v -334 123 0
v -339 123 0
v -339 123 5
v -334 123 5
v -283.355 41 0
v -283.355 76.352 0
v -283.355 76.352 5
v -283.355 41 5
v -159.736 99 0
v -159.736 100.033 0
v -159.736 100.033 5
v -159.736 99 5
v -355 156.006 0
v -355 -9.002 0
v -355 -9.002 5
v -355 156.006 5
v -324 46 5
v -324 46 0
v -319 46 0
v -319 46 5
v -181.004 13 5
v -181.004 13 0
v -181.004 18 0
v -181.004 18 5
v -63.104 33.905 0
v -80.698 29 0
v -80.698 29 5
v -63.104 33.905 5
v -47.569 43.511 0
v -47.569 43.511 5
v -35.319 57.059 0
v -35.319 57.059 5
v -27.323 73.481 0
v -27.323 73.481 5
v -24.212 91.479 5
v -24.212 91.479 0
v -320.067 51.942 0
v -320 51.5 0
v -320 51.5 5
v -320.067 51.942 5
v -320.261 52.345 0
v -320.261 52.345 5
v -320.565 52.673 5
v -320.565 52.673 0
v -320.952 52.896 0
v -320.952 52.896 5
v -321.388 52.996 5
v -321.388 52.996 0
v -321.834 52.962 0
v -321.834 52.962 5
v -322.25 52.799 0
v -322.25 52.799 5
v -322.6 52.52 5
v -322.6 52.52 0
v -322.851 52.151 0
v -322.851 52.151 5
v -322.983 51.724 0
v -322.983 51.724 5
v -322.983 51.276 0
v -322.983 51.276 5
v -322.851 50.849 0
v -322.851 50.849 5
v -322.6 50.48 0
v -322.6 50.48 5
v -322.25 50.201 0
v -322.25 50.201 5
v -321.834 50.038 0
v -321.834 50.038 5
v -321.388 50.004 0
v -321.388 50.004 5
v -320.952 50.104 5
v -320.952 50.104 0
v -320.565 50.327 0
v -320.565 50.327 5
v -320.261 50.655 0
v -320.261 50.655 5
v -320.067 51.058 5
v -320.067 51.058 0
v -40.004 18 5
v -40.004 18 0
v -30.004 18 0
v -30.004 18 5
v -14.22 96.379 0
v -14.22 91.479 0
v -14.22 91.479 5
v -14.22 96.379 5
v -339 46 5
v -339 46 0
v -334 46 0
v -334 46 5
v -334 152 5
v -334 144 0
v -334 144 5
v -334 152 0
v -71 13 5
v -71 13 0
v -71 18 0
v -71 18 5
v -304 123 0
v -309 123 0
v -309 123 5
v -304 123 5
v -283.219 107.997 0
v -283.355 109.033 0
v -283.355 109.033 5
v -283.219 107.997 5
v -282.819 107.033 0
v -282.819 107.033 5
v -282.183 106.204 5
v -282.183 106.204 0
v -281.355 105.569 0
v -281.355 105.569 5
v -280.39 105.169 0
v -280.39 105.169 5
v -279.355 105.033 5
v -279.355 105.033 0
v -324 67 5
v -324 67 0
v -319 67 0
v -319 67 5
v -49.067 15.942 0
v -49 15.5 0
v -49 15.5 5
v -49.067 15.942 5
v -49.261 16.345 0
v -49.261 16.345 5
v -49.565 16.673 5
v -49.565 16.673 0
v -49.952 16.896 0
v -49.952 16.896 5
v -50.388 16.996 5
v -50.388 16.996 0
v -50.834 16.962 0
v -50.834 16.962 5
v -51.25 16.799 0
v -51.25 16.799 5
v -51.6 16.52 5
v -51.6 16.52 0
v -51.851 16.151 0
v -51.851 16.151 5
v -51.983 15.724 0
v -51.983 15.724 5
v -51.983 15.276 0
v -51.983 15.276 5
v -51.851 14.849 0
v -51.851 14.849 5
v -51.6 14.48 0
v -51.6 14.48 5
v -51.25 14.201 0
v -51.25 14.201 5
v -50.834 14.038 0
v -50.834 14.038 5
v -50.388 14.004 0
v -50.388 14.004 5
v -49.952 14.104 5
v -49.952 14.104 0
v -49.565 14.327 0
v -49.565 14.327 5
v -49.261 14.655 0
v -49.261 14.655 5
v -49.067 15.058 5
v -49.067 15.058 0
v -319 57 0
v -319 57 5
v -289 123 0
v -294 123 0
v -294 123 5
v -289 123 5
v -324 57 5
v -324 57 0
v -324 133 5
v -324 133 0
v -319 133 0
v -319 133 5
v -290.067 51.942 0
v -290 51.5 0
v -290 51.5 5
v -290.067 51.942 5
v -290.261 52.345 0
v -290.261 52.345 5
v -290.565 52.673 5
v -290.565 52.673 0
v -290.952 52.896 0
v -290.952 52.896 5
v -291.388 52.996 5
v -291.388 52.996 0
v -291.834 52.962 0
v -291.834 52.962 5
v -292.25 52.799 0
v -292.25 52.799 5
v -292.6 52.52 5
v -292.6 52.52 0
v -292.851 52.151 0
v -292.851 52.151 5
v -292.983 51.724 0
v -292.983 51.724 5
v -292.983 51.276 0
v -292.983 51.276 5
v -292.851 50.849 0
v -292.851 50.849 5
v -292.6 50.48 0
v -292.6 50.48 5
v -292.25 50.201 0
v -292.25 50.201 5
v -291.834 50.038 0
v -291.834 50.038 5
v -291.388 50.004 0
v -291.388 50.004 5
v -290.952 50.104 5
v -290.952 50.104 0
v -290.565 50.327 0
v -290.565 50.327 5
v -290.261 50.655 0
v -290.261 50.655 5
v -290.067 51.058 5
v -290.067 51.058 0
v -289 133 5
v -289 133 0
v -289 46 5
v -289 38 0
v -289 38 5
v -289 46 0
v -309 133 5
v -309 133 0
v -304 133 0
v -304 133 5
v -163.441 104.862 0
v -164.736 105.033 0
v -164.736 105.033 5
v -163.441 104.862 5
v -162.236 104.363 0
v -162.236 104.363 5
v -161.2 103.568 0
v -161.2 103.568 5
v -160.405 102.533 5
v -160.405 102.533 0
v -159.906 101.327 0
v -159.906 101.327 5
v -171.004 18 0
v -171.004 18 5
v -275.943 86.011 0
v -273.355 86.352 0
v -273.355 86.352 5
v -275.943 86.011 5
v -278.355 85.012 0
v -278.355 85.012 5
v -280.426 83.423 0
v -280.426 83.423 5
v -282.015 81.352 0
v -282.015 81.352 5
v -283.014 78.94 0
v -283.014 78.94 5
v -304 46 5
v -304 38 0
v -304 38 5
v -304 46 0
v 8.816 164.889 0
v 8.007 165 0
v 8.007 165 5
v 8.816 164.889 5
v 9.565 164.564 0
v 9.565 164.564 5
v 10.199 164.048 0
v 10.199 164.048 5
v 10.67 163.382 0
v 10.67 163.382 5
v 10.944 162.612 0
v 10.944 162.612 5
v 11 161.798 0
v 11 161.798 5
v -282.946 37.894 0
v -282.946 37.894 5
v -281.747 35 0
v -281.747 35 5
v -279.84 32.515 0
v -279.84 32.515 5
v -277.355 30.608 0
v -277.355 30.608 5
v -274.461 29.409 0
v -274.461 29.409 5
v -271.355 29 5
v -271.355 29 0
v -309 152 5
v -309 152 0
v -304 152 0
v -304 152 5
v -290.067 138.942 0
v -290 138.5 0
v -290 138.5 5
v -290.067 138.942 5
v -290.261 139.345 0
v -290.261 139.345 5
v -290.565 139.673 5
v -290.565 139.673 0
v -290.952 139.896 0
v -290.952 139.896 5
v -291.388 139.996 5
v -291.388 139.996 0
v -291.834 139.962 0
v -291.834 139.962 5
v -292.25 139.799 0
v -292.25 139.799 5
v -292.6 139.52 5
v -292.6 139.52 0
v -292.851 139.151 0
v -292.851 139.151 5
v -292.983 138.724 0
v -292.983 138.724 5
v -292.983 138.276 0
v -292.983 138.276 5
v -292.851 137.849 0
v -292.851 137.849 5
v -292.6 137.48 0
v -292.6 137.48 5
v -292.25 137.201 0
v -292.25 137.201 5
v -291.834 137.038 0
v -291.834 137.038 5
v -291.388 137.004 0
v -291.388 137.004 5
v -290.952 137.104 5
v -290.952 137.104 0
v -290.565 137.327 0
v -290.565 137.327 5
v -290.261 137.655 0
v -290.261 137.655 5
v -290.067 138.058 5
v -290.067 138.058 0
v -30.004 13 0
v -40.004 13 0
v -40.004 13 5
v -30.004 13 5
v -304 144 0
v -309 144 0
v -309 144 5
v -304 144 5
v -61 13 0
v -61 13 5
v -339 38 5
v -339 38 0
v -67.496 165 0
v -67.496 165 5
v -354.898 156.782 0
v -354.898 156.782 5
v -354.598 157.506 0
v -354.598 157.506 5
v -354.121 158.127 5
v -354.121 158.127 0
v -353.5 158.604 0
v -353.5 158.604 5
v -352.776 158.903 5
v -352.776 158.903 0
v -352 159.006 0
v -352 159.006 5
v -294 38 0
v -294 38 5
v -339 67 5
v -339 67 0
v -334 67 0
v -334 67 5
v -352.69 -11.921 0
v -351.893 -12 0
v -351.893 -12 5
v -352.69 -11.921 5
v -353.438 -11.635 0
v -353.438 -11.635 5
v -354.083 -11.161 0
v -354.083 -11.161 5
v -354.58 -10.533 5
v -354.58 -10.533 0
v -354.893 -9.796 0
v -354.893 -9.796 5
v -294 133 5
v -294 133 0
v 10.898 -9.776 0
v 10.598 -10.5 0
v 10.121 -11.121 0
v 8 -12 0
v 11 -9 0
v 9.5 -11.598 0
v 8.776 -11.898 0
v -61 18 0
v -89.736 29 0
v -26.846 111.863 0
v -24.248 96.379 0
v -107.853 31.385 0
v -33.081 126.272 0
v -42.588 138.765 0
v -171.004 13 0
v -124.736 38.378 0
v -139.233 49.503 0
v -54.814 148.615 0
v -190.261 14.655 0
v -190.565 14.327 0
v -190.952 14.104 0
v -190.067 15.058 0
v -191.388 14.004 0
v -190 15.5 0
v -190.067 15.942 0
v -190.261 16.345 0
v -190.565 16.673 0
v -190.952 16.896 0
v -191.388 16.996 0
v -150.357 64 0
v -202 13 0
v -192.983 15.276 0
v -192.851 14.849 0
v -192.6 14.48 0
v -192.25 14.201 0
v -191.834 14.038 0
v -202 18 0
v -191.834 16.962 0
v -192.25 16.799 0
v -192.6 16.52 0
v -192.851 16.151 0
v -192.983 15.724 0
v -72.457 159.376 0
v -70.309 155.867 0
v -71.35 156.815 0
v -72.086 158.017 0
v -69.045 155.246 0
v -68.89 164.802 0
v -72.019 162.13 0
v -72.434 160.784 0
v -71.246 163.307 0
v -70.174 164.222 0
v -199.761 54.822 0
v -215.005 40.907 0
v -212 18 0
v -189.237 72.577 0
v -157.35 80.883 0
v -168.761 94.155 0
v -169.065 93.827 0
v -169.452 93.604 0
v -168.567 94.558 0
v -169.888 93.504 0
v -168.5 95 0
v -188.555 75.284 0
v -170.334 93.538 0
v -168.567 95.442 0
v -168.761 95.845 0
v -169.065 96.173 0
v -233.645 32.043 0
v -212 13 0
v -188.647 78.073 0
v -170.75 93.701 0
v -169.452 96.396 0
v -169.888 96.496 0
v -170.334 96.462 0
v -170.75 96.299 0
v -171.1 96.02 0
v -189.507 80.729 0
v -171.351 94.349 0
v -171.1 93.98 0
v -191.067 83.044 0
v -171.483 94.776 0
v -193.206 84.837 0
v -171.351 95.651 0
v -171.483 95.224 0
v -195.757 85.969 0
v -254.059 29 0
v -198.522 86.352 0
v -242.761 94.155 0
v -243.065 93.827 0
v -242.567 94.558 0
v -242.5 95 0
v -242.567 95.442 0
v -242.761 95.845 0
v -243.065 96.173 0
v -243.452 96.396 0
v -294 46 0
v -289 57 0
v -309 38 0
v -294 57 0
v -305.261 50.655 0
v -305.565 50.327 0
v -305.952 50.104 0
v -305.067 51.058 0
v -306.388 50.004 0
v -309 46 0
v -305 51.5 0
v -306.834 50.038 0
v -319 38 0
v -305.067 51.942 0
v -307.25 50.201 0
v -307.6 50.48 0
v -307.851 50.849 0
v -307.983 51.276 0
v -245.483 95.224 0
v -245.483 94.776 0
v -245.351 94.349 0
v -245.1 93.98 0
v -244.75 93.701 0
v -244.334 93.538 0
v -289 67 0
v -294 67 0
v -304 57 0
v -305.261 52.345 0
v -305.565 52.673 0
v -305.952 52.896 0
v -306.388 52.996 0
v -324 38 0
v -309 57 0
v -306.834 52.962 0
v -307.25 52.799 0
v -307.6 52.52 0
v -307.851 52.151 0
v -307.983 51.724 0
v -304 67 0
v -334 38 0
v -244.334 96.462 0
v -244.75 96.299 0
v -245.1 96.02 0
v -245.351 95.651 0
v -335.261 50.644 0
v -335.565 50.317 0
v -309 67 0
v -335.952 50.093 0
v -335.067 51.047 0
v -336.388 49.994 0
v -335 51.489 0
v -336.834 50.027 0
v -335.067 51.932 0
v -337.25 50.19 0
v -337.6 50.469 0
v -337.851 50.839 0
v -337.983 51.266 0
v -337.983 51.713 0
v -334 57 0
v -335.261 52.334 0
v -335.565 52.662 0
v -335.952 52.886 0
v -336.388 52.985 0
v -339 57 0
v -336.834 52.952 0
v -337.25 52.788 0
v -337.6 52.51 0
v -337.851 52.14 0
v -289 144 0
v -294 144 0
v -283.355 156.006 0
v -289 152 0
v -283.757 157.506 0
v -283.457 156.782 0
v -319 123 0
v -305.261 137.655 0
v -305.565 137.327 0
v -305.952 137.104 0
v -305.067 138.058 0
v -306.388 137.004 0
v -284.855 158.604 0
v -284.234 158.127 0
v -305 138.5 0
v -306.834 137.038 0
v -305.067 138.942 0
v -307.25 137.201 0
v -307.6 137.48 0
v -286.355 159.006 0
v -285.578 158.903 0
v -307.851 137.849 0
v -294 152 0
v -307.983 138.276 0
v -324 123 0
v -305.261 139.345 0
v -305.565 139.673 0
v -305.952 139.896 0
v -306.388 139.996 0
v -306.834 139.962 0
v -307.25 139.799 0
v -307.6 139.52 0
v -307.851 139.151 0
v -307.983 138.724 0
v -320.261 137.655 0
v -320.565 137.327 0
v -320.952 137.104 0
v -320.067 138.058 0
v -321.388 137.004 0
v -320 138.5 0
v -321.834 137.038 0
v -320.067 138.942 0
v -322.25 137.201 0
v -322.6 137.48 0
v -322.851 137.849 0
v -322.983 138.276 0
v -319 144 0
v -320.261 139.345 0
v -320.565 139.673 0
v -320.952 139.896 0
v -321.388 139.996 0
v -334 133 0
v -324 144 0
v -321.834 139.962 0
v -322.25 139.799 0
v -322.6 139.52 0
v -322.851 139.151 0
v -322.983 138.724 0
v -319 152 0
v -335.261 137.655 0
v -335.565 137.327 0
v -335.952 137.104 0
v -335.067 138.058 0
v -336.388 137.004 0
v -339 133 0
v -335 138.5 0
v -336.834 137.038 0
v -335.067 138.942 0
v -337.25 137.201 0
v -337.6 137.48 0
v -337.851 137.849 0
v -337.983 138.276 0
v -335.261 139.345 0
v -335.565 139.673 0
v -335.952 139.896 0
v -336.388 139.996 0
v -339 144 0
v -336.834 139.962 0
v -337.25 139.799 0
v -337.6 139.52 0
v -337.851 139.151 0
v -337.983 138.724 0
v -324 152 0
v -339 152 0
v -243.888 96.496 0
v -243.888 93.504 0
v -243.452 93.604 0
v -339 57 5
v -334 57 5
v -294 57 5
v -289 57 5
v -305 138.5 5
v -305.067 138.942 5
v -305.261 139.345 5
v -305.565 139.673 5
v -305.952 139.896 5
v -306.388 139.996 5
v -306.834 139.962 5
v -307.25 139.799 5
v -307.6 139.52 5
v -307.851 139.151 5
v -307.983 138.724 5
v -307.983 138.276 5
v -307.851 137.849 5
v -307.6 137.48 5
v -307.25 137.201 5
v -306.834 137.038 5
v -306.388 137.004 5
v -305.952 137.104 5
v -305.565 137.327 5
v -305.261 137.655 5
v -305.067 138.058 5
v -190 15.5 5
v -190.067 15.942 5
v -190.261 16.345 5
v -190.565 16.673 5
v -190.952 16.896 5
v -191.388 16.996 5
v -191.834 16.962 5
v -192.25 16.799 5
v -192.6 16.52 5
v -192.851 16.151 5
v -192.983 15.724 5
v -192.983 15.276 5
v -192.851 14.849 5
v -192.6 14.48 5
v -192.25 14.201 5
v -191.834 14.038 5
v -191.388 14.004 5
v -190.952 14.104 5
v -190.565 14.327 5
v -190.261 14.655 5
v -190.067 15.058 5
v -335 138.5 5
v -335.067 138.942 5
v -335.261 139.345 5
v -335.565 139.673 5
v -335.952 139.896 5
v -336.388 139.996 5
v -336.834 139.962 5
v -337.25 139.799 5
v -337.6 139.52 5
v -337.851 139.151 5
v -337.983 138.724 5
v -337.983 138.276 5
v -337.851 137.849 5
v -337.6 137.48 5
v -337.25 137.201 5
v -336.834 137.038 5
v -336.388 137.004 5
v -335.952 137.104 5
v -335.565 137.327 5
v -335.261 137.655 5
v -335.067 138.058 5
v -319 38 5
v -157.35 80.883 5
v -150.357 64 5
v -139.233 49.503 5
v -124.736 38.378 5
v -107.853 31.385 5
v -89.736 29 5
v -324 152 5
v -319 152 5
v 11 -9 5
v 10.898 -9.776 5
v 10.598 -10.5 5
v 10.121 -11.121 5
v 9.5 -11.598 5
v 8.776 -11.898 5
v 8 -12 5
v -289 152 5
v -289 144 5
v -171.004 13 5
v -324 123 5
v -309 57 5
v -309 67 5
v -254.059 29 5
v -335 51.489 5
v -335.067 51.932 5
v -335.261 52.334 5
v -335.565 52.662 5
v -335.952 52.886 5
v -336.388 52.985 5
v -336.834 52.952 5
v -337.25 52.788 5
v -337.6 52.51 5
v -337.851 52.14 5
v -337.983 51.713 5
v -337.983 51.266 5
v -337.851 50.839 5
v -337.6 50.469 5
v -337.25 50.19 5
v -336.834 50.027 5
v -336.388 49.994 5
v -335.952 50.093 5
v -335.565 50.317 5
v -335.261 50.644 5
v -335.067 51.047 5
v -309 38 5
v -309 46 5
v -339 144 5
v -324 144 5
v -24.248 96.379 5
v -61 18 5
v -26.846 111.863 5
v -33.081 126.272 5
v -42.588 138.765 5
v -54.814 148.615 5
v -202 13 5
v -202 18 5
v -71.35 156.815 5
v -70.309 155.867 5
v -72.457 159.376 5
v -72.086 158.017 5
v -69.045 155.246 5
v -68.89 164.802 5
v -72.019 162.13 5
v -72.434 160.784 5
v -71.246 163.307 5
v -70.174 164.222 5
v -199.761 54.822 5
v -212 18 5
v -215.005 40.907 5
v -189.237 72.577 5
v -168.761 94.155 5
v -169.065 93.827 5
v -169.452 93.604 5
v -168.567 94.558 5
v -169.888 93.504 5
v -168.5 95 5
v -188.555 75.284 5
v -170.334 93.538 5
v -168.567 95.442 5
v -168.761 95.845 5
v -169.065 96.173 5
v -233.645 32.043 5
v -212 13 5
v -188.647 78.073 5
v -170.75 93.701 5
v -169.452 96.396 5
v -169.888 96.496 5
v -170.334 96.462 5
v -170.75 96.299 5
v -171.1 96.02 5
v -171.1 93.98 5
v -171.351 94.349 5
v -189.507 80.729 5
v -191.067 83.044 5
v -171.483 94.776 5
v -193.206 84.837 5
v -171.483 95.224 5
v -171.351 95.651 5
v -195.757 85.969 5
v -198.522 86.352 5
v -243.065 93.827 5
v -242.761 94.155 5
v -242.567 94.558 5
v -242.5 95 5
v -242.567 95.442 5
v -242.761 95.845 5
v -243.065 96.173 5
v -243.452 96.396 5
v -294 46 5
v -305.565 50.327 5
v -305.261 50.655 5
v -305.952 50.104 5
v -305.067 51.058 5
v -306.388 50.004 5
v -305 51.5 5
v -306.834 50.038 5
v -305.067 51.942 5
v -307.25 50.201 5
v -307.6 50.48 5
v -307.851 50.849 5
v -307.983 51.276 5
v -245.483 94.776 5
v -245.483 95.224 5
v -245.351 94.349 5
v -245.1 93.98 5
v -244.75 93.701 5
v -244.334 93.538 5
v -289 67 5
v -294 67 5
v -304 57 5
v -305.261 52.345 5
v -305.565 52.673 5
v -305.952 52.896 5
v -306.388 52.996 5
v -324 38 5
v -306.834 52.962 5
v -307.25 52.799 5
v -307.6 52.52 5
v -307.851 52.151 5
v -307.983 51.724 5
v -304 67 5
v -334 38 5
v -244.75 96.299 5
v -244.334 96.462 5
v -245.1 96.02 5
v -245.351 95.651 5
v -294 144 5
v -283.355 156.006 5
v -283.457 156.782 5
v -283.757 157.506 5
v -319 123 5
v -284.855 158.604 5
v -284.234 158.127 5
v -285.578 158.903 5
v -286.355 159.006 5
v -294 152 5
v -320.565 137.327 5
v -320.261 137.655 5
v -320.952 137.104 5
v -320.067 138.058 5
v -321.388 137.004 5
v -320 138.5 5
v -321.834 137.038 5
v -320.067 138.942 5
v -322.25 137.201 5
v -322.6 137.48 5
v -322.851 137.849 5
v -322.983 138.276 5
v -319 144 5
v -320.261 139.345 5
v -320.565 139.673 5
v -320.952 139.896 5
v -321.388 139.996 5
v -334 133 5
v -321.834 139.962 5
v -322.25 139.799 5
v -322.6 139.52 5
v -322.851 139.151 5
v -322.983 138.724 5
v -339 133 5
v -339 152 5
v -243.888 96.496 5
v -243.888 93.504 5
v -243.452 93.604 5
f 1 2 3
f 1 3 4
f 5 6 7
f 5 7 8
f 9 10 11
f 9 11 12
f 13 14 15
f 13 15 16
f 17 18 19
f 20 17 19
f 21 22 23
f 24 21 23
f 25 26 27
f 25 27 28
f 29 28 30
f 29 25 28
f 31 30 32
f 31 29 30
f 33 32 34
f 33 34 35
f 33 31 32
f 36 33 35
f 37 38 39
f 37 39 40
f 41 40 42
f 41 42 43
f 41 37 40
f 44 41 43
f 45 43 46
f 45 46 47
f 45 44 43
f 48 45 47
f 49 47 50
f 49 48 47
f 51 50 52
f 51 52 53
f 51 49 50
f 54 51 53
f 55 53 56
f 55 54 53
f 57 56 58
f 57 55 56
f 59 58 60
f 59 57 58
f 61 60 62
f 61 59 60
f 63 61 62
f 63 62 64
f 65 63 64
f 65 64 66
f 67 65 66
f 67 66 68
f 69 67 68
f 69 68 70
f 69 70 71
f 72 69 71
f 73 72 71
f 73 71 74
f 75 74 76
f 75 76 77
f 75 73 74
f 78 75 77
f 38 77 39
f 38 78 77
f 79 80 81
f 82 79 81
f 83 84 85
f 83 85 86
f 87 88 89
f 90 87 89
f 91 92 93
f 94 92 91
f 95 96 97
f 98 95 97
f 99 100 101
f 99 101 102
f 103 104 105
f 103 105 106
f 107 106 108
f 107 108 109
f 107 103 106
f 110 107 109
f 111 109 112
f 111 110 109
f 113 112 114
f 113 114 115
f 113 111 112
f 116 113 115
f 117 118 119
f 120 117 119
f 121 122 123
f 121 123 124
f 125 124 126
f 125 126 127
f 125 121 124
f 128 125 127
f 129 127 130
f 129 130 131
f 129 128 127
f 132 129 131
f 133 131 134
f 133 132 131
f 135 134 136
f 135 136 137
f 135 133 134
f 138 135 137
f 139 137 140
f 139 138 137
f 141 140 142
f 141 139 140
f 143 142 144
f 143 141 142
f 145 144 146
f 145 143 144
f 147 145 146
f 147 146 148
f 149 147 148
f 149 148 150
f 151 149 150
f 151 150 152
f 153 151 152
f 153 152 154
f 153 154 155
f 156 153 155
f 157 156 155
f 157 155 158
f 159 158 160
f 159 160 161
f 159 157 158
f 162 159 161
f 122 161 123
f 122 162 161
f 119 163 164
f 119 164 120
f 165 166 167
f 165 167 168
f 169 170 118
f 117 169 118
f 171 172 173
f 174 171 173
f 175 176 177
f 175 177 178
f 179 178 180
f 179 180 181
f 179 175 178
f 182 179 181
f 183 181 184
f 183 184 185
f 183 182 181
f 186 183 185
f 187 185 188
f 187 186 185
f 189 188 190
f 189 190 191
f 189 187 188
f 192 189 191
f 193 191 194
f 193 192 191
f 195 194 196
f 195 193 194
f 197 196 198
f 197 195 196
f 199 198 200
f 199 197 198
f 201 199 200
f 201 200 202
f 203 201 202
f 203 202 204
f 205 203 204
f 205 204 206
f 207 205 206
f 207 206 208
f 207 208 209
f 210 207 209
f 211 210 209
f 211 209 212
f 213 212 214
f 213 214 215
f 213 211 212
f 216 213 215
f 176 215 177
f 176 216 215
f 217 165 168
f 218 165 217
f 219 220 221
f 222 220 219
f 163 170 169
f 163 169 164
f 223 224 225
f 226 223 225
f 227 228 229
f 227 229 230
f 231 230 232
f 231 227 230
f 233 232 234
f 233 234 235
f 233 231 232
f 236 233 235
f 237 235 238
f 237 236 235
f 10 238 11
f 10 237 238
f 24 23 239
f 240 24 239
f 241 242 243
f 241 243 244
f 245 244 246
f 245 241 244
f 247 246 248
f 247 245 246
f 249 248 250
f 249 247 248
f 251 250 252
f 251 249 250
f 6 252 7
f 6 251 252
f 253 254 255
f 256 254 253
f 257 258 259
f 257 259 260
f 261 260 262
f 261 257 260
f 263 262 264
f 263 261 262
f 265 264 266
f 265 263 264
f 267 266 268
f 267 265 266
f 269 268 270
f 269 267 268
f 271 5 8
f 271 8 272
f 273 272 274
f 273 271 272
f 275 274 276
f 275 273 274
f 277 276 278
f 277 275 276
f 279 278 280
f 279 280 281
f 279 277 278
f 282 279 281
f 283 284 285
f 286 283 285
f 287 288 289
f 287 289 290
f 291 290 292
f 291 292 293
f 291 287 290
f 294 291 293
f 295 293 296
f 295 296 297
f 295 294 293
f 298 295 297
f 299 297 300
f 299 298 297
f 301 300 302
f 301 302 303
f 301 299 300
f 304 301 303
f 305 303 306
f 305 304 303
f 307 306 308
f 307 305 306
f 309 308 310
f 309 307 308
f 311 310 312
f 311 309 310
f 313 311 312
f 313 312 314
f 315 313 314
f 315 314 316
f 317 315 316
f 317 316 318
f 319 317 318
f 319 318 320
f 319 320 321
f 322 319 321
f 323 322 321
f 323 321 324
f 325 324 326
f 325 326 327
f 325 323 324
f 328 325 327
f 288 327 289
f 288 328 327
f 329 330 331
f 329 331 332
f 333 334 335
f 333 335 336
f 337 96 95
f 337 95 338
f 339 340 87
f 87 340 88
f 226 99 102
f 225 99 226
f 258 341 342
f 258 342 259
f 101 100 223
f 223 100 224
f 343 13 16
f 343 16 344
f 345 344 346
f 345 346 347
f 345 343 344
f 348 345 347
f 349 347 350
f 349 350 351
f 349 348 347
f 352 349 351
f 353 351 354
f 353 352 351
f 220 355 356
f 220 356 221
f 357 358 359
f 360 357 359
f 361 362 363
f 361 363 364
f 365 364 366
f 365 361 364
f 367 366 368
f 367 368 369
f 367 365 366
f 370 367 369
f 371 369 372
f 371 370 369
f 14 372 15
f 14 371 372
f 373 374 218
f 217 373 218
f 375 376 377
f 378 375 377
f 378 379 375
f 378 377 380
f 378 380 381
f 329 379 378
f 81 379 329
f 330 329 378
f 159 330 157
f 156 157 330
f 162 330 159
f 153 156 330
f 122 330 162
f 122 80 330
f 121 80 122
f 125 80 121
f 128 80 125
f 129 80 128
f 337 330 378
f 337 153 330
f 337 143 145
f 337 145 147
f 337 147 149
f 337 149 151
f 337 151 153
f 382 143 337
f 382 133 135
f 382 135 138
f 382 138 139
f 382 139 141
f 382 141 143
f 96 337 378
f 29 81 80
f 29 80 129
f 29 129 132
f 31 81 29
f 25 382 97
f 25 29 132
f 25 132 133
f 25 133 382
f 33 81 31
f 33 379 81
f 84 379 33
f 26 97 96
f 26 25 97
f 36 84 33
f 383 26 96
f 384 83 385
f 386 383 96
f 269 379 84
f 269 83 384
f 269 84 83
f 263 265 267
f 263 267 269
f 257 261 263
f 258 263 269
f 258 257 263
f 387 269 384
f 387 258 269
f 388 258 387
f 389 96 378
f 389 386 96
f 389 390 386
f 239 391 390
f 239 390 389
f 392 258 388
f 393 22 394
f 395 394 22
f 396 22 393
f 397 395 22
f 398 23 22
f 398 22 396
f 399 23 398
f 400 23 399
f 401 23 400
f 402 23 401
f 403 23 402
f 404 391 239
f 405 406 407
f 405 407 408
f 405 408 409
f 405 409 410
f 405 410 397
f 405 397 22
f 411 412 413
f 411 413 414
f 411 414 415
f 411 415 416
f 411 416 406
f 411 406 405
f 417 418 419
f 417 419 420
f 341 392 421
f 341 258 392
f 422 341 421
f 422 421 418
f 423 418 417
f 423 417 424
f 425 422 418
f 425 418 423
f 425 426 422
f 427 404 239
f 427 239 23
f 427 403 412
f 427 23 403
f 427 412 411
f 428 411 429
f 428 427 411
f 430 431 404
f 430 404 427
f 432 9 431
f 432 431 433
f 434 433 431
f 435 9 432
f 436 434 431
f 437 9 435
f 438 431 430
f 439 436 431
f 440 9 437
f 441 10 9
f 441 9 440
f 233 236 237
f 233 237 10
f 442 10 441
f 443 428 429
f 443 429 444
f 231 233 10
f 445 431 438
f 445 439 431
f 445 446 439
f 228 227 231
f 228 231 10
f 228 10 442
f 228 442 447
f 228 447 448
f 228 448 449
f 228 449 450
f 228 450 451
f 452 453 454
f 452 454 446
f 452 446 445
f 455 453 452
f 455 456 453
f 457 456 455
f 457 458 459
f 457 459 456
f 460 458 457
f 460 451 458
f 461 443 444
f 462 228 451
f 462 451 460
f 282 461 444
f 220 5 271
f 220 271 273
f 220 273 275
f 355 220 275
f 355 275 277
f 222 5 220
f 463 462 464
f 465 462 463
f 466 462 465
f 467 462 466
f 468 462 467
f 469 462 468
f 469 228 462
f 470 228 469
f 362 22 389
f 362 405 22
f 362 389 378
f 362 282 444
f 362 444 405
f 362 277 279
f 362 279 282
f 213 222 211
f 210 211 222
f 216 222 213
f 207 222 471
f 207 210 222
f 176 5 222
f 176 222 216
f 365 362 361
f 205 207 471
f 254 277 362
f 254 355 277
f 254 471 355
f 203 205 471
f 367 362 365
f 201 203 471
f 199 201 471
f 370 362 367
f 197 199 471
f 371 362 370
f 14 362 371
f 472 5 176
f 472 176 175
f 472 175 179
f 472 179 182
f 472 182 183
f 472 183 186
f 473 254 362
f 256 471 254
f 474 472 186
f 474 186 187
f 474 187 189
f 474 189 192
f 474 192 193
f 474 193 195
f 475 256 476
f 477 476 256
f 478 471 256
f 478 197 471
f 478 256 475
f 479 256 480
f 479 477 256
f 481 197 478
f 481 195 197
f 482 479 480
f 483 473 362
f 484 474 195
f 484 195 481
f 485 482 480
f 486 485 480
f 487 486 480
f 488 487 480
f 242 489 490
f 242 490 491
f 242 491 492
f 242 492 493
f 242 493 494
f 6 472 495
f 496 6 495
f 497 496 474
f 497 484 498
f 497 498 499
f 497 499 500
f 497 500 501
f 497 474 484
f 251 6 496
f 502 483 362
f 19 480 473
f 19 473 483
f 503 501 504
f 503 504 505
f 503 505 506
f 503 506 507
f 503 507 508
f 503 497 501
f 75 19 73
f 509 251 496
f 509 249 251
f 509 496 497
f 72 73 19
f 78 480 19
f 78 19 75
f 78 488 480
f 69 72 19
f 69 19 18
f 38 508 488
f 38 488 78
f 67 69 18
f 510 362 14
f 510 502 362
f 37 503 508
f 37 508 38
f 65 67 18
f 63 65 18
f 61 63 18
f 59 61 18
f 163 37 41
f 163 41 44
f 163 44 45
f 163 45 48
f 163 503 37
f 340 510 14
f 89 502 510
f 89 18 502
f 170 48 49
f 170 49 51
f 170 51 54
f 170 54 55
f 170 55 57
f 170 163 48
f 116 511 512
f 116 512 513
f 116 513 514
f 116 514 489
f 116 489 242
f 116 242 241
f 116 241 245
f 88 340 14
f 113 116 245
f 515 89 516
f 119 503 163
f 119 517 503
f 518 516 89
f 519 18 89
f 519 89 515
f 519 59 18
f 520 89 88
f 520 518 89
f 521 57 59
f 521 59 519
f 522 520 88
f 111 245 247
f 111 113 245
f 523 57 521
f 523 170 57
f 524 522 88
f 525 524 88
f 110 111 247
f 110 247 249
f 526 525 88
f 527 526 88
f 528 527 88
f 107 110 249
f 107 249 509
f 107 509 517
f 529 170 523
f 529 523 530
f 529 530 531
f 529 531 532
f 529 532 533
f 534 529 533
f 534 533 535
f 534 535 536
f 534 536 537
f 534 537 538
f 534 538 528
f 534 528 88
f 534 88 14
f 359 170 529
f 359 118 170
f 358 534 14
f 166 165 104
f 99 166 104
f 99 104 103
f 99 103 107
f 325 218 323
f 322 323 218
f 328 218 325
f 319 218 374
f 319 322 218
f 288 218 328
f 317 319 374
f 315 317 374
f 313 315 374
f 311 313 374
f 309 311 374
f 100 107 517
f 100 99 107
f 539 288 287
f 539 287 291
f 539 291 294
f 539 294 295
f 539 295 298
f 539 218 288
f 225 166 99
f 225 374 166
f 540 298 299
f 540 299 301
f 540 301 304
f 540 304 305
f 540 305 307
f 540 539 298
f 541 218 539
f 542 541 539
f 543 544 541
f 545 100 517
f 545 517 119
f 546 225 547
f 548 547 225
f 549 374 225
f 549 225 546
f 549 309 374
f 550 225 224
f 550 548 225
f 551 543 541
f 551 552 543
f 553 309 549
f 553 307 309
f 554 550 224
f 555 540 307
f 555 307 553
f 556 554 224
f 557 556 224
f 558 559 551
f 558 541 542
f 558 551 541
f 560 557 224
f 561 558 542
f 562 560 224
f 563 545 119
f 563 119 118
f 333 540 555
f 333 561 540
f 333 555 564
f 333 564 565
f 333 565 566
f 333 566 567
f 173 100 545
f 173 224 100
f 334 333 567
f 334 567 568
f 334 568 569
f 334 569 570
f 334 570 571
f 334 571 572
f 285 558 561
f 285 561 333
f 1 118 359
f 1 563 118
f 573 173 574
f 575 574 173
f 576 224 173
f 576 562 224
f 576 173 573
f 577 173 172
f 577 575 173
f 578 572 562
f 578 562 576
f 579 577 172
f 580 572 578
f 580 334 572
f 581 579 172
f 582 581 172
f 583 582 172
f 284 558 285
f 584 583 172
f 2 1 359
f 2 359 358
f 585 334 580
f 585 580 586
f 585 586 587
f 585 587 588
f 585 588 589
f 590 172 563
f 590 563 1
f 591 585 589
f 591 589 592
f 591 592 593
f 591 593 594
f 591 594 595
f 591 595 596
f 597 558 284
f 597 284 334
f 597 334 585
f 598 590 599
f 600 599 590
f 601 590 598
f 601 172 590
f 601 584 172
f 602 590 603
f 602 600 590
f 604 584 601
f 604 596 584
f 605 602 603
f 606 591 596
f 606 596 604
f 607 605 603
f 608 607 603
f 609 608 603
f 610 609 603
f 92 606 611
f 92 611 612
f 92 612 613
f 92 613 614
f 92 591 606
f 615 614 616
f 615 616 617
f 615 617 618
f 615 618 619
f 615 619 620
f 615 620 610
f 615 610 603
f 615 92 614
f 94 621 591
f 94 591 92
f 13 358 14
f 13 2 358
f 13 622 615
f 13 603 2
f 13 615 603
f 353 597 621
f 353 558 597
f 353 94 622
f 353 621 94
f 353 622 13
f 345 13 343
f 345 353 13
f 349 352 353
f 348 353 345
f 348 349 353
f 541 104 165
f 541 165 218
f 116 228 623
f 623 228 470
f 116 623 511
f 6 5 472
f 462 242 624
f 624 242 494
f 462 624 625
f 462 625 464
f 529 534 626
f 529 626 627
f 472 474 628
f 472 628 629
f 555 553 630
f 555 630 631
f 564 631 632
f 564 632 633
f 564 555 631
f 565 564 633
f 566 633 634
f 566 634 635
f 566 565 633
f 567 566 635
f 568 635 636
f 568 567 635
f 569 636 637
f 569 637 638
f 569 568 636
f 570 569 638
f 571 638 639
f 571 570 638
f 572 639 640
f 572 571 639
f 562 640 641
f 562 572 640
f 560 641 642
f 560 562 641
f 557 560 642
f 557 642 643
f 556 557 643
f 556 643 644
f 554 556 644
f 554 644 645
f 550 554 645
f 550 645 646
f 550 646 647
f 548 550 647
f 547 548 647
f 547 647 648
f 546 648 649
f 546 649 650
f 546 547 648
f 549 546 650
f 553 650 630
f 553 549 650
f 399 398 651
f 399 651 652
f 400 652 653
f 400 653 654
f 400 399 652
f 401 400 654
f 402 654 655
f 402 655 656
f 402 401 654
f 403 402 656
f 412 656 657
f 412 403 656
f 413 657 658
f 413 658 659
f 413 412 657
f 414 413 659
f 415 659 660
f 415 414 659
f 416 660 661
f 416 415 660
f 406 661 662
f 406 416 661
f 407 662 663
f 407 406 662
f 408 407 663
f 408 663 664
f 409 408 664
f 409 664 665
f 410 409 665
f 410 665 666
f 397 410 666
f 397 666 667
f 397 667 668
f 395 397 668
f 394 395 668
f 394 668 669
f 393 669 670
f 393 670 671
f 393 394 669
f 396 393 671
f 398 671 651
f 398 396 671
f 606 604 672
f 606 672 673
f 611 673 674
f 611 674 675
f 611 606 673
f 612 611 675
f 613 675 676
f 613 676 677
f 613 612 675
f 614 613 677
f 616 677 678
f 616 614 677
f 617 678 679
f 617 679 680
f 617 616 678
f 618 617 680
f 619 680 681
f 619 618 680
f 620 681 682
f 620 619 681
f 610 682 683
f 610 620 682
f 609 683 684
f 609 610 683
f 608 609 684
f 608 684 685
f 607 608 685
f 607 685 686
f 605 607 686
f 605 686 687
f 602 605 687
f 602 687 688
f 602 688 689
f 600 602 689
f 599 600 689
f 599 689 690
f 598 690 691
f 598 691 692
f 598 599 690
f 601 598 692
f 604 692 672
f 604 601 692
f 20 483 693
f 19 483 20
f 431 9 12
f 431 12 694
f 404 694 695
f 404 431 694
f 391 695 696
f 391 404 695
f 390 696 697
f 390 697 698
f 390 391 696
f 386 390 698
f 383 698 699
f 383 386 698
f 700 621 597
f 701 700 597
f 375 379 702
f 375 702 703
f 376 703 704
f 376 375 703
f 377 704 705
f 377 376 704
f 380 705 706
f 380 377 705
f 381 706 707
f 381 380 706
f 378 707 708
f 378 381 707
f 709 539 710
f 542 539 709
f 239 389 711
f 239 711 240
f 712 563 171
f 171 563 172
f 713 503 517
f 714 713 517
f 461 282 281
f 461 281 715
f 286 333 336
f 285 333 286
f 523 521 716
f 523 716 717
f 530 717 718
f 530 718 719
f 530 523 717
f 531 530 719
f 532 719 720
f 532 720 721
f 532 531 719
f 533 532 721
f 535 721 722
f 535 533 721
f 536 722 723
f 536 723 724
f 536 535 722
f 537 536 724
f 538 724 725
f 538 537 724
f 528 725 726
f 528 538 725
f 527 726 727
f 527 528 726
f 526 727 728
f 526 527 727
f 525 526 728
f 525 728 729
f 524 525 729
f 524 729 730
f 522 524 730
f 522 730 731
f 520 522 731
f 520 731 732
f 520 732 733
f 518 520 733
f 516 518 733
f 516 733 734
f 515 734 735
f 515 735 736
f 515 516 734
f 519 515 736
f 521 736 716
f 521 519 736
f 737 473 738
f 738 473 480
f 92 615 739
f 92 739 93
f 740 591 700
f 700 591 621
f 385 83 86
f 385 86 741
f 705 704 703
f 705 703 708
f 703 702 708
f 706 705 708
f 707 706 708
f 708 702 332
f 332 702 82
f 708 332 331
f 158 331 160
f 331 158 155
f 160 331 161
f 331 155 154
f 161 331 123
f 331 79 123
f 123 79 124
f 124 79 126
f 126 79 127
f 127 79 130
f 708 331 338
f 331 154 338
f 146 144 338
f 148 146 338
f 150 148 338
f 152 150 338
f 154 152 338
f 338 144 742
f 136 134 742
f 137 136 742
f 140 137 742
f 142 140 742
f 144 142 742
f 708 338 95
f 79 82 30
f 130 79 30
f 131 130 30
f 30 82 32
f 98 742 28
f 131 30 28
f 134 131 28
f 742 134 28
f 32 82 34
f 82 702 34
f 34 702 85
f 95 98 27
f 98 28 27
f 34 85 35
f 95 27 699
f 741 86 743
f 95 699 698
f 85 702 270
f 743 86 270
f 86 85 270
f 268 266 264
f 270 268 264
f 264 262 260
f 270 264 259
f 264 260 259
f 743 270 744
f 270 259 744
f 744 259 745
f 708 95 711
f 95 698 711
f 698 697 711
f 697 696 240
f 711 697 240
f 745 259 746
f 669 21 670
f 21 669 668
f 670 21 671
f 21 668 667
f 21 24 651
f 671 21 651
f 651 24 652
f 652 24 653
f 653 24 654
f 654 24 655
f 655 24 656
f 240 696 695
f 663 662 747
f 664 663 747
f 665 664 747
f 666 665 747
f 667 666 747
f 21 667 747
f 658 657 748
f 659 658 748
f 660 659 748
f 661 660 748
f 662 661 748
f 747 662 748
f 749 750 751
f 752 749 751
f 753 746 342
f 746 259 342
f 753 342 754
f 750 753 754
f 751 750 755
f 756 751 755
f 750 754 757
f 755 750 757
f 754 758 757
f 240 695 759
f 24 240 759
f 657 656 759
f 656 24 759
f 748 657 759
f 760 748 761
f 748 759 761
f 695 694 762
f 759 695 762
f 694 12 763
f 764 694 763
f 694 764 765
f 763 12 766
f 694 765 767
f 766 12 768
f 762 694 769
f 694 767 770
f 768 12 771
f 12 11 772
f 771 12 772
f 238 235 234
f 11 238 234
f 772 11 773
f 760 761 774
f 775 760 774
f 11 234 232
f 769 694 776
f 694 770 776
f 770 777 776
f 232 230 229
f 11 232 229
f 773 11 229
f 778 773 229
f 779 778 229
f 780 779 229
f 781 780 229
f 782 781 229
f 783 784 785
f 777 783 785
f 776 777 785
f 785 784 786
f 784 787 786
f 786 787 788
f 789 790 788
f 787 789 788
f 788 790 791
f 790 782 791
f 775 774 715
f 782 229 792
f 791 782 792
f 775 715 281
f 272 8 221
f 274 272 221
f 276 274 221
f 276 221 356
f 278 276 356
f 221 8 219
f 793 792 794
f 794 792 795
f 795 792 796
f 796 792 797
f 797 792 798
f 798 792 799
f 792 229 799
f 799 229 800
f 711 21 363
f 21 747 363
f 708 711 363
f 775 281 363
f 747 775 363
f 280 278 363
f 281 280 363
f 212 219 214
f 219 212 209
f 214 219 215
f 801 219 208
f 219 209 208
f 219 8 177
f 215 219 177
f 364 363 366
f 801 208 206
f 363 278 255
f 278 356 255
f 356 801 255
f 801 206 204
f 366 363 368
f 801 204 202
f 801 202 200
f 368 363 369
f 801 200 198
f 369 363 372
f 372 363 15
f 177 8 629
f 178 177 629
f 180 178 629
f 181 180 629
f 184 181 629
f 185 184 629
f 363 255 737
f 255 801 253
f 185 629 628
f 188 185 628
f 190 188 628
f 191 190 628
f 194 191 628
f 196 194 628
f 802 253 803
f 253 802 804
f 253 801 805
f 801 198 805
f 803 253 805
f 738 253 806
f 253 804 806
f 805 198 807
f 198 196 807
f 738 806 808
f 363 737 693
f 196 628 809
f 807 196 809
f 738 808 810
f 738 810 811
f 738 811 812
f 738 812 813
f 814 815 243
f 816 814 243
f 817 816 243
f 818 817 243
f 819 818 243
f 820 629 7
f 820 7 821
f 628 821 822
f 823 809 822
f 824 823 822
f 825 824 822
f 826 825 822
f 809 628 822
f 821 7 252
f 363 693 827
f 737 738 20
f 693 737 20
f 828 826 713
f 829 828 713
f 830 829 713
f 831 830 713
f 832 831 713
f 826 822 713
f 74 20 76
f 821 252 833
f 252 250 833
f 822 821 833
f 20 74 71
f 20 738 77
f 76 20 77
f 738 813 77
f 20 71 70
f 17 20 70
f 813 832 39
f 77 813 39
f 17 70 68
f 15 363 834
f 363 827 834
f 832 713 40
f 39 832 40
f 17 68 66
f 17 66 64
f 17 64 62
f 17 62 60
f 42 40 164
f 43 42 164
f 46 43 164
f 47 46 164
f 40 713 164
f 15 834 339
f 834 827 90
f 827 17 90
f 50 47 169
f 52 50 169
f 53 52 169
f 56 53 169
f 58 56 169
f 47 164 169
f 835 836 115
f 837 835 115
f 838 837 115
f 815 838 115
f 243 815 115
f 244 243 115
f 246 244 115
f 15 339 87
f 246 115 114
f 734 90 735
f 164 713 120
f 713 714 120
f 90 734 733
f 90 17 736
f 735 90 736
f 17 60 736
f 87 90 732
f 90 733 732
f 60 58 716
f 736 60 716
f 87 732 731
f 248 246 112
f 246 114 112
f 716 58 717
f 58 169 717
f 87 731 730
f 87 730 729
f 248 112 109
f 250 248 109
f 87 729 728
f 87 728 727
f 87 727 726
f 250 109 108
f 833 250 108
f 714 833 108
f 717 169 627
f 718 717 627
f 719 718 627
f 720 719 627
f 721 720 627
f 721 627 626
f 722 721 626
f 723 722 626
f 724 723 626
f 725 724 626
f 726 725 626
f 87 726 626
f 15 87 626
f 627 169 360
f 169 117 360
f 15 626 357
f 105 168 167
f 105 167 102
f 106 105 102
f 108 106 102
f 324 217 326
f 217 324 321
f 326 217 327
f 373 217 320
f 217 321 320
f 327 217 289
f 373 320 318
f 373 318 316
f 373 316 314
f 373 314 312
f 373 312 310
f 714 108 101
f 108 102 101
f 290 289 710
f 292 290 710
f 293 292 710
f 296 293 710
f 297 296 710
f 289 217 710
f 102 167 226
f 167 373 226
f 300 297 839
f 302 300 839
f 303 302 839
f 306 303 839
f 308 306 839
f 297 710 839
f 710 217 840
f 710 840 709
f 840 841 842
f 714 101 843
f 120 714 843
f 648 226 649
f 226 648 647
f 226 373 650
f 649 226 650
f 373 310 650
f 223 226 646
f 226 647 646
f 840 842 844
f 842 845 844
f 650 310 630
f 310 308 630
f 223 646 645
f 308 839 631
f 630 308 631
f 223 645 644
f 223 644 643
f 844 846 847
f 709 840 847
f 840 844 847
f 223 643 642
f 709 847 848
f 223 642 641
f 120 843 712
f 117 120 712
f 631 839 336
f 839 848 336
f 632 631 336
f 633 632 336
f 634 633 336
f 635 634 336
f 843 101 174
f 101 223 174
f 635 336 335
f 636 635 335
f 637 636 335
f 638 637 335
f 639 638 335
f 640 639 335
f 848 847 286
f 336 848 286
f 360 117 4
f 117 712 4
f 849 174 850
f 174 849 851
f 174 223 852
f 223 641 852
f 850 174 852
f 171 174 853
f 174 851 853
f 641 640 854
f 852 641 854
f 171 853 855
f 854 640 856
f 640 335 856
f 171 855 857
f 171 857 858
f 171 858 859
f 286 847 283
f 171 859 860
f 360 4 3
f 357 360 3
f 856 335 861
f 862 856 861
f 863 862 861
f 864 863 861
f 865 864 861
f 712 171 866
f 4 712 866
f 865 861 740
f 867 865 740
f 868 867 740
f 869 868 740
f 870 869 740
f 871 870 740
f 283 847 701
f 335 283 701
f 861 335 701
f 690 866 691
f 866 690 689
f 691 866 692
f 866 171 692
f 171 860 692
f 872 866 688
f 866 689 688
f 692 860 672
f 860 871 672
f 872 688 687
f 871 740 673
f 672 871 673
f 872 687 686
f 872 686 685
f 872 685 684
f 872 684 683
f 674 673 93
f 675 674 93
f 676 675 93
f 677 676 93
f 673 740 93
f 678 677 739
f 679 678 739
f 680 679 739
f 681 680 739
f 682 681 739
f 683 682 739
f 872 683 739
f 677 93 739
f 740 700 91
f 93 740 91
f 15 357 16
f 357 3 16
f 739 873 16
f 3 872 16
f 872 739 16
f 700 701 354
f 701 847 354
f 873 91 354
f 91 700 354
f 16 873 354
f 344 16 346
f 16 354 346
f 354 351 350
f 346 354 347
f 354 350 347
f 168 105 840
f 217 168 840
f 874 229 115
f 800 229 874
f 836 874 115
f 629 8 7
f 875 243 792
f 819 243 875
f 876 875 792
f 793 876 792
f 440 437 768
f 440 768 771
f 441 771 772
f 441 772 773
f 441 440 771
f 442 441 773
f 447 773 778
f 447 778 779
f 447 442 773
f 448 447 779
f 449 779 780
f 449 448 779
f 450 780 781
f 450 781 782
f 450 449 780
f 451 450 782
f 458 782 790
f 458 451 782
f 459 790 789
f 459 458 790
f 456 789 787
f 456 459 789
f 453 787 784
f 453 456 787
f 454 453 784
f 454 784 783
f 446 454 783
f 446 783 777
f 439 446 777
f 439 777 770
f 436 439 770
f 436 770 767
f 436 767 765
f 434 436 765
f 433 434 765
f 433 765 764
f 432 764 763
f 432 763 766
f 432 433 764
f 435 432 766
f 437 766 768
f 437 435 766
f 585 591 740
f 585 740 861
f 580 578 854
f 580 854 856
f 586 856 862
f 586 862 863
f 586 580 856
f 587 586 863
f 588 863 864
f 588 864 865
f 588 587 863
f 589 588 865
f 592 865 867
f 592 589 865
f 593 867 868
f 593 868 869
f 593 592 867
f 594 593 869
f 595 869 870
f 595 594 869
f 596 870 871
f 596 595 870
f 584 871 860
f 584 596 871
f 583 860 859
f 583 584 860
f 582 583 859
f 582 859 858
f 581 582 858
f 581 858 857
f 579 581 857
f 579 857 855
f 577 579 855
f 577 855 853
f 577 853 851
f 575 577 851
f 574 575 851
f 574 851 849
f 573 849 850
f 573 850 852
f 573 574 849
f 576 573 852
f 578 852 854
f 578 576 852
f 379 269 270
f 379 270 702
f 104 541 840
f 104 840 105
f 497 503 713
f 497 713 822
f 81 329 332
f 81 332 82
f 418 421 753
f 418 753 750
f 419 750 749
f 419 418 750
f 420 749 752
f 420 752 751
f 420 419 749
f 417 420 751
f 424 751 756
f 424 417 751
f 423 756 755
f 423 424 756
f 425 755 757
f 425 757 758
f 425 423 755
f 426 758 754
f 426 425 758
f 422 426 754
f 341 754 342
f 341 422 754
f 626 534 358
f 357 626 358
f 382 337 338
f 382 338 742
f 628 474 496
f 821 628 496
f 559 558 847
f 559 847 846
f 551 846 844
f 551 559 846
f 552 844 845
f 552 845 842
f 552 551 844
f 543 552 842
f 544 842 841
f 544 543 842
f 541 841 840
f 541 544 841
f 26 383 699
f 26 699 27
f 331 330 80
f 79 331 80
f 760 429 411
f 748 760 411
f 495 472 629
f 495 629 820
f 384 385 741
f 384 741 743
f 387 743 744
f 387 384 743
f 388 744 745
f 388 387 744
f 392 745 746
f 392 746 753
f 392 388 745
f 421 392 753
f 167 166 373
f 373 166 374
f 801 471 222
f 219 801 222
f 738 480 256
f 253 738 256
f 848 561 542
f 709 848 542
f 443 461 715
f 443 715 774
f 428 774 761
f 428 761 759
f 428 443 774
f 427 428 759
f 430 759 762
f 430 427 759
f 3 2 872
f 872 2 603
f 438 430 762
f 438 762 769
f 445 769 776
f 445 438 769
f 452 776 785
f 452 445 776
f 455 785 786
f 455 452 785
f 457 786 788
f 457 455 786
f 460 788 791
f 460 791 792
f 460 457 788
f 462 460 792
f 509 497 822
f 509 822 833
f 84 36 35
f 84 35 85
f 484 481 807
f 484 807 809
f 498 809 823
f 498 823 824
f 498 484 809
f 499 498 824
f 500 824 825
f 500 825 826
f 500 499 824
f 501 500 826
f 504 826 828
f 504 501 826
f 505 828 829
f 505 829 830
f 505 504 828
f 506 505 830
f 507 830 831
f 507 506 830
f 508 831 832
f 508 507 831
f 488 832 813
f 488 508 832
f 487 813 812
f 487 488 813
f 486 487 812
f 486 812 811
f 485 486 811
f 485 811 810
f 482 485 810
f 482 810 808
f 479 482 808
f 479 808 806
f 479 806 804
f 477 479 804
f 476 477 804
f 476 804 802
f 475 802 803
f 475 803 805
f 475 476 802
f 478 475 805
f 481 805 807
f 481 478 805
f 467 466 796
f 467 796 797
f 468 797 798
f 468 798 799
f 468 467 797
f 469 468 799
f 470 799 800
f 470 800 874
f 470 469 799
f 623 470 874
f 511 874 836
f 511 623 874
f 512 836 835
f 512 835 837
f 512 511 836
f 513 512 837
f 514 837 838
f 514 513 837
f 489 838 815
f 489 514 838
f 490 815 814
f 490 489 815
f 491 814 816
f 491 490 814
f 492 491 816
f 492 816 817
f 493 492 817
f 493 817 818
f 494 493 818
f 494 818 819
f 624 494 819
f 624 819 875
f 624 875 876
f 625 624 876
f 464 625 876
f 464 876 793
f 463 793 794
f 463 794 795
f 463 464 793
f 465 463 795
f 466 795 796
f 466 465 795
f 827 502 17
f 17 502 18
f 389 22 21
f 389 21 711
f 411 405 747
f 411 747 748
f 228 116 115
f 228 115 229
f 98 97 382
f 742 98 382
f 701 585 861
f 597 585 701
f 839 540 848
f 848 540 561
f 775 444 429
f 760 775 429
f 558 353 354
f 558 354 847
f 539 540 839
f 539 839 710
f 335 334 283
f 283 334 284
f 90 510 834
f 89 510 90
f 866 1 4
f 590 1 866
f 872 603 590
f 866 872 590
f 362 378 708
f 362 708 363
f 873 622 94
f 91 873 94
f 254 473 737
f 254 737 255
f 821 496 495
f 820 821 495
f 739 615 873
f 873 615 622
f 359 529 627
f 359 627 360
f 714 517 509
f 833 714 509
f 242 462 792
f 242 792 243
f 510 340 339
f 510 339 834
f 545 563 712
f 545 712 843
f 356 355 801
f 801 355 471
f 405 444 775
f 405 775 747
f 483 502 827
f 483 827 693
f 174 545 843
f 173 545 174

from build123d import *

# Parameters (mm, degrees)
MODEL_R                  = 1.499999966
MODEL_W                  = 5.000000075
MODEL_H                  = 8.000000119
MODEL_W_2                = 5.000000074
MODEL_H_2                = 10.000000149
MODEL_H_3                = 8.00000012
MODEL_H_4                = 9.999934109
MODEL_W_3                = 10.000000149
MODEL_H_5                = 5.000000075
RESSALTO_EXTRUS_O1_DEPTH = 5


with BuildPart() as part:
    # Model → Ressalto-extrusão1 (new body)
    with BuildSketch(Plane.XY):
        with BuildLine():
            Line((8, -12), (-351.893274345, -12))
            ThreePointArc((-351.893274345, -12), (-354.083207051, -11.160599835), (-354.999940033, -9.001896861))
            Line((-354.999940033, -9.001896861), (-354.999940033, 156.005514216))
            ThreePointArc((-354.999940033, 156.005514216), (-354.121260376, 158.126834559), (-351.999940033, 159.005514216))
            Line((-351.999940033, 159.005514216), (-286.35488426, 159.005514216))
            ThreePointArc((-286.35488426, 159.005514216), (-284.233563917, 158.126834559), (-283.35488426, 156.005514216))
            Line((-283.35488426, 156.005514216), (-283.35488426, 109.0327131))
            ThreePointArc((-283.35488426, 109.0327131), (-282.183311385, 106.204285975), (-279.35488426, 105.0327131))
            Line((-279.35488426, 105.0327131), (-240.26491068, 105.0327131))
            Line((-240.26491068, 105.0327131), (-174.726717369, 105.0327131))
            Line((-174.726717369, 105.0327131), (-164.735516671, 105.0327131))
            ThreePointArc((-164.735516671, 105.0327131), (-161.199982765, 103.568247006), (-159.735516671, 100.0327131))
            Line((-159.735516671, 100.0327131), (-159.735516671, 99.000000432))
            ThreePointArc((-159.735516671, 99.000000432), (-139.232991354, 49.502525749), (-89.735516671, 29.000000432))
            Line((-89.735516671, 29.000000432), (-80.697953904, 29.000000432))
            ThreePointArc((-80.697953904, 29.000000432), (-40.9657847, 49.85268265), (-24.211685646, 91.479354272))
            Line((-24.211685646, 91.479354272), (-14.220289858, 91.479354272))
            Line((-14.220289858, 91.479354272), (-14.220289858, 96.379354272))
            Line((-14.220289858, 96.379354272), (-24.248305583, 96.379354272))
            ThreePointArc((-24.248305583, 96.379354272), (-37.455951456, 132.806572516), (-69.044817062, 155.245995598))
            ThreePointArc((-69.044817062, 155.245995598), (-72.433921946, 160.78421234), (-67.495803781, 165))
            Line((-67.495803781, 165), (8.006839019, 165))
            ThreePointArc((8.006839019, 165), (10.19856892, 164.048492138), (11, 161.797546694))
            Line((11, 161.797546694), (11, -9))
            ThreePointArc((11, -9), (10.121320344, -11.121320344), (8, -12))
        make_face()
        with Locations((-291.500004344, 51.500000767)):
            Circle(MODEL_R, mode=Mode.SUBTRACT)
        with Locations((-291.500004344, 138.500002064)):
            Circle(MODEL_R, mode=Mode.SUBTRACT)
        with Locations((-306.500004567, 138.500002064)):
            Circle(MODEL_R, mode=Mode.SUBTRACT)
        with Locations((-336.499940034, 51.48938817)):
            Circle(MODEL_R, mode=Mode.SUBTRACT)
        with Locations((-306.500004567, 51.500000767)):
            Circle(MODEL_R, mode=Mode.SUBTRACT)
        with Locations((-336.499992479, 138.499996904)):
            Circle(MODEL_R, mode=Mode.SUBTRACT)
        with Locations((-321.500004791, 138.500002064)):
            Circle(MODEL_R, mode=Mode.SUBTRACT)
        with Locations((-321.500004791, 51.500000767)):
            Circle(MODEL_R, mode=Mode.SUBTRACT)
        with Locations((-50.500000753, 15.500000231)):
            Circle(MODEL_R, mode=Mode.SUBTRACT)
        with Locations((-170.000002533, 95.000001416)):
            Circle(MODEL_R, mode=Mode.SUBTRACT)
        with Locations((-244.000003636, 95.000001416)):
            Circle(MODEL_R, mode=Mode.SUBTRACT)
        with Locations((-191.500002854, 15.500000231)):
            Circle(MODEL_R, mode=Mode.SUBTRACT)
        with Locations((-321.500004791, 42.000000626)):
            Rectangle(MODEL_W, MODEL_H, mode=Mode.SUBTRACT)
        with Locations((-321.499939997, 147.999896164)):
            Rectangle(MODEL_W_2, MODEL_H, mode=Mode.SUBTRACT)
        with Locations((-306.499940072, 147.999896164)):
            Rectangle(MODEL_W, MODEL_H, mode=Mode.SUBTRACT)
        with Locations((-336.500005014, 62.000000924)):
            Rectangle(MODEL_W_2, MODEL_H_2, mode=Mode.SUBTRACT)
        with Locations((-336.500005014, 42.000000626)):
            Rectangle(MODEL_W_2, MODEL_H, mode=Mode.SUBTRACT)
        with Locations((-321.500004791, 62.000000924)):
            Rectangle(MODEL_W, MODEL_H_2, mode=Mode.SUBTRACT)
        with Locations((-336.499939997, 147.999896164)):
            Rectangle(MODEL_W_2, MODEL_H, mode=Mode.SUBTRACT)
        with Locations((-306.500004567, 62.000000924)):
            Rectangle(MODEL_W_2, MODEL_H_2, mode=Mode.SUBTRACT)
        with Locations((-306.500004567, 42.000000626)):
            Rectangle(MODEL_W_2, MODEL_H, mode=Mode.SUBTRACT)
        with Locations((-321.499939997, 127.999958382)):
            Rectangle(MODEL_W_2, MODEL_H_2, mode=Mode.SUBTRACT)
        with Locations((-336.499939997, 127.999958382)):
            Rectangle(MODEL_W_2, MODEL_H_2, mode=Mode.SUBTRACT)
        with Locations((-306.499940072, 127.999958382)):
            Rectangle(MODEL_W, MODEL_H_2, mode=Mode.SUBTRACT)
        with Locations((-291.499939997, 147.999896164)):
            Rectangle(MODEL_W_2, MODEL_H, mode=Mode.SUBTRACT)
        with Locations((-291.499939997, 127.999958382)):
            Rectangle(MODEL_W_2, MODEL_H_2, mode=Mode.SUBTRACT)
        with Locations((-291.499939997, 41.999963457)):
            Rectangle(MODEL_W_2, MODEL_H_3, mode=Mode.SUBTRACT)
        with Locations((-291.499939997, 61.99993092)):
            Rectangle(MODEL_W_2, MODEL_H_4, mode=Mode.SUBTRACT)
        with BuildLine():
            Line((-283.35488426, 76.35164541), (-283.35488426, 41.000000433))
            ThreePointArc((-283.35488426, 41.000000433), (-279.840165634, 32.514719058), (-271.354884259, 29.000000432))
            Line((-271.354884259, 29.000000432), (-254.058912469, 29.000000432))
            ThreePointArc((-254.058912469, 29.000000432), (-215.005187795, 40.906914879), (-189.237444794, 72.576955029))
            ThreePointArc((-189.237444794, 72.576955029), (-190.205525947, 81.94100534), (-198.52230859, 86.35164541))
            Line((-198.52230859, 86.35164541), (-273.35488426, 86.35164541))
            ThreePointArc((-273.35488426, 86.35164541), (-280.425952072, 83.422713221), (-283.35488426, 76.35164541))
        make_face(mode=Mode.SUBTRACT)
        with Locations((-66.000000537, 15.500000038)):
            Rectangle(MODEL_W_3, MODEL_H_5, mode=Mode.SUBTRACT)
        with Locations((-35.004146846, 15.500000038)):
            Rectangle(MODEL_W_3, MODEL_H_5, mode=Mode.SUBTRACT)
        with Locations((-207.000000537, 15.500000038)):
            Rectangle(MODEL_W_3, MODEL_H_5, mode=Mode.SUBTRACT)
        with Locations((-176.004146697, 15.500000038)):
            Rectangle(MODEL_W_3, MODEL_H_5, mode=Mode.SUBTRACT)
    extrude(amount=RESSALTO_EXTRUS_O1_DEPTH)


solid = part.part
